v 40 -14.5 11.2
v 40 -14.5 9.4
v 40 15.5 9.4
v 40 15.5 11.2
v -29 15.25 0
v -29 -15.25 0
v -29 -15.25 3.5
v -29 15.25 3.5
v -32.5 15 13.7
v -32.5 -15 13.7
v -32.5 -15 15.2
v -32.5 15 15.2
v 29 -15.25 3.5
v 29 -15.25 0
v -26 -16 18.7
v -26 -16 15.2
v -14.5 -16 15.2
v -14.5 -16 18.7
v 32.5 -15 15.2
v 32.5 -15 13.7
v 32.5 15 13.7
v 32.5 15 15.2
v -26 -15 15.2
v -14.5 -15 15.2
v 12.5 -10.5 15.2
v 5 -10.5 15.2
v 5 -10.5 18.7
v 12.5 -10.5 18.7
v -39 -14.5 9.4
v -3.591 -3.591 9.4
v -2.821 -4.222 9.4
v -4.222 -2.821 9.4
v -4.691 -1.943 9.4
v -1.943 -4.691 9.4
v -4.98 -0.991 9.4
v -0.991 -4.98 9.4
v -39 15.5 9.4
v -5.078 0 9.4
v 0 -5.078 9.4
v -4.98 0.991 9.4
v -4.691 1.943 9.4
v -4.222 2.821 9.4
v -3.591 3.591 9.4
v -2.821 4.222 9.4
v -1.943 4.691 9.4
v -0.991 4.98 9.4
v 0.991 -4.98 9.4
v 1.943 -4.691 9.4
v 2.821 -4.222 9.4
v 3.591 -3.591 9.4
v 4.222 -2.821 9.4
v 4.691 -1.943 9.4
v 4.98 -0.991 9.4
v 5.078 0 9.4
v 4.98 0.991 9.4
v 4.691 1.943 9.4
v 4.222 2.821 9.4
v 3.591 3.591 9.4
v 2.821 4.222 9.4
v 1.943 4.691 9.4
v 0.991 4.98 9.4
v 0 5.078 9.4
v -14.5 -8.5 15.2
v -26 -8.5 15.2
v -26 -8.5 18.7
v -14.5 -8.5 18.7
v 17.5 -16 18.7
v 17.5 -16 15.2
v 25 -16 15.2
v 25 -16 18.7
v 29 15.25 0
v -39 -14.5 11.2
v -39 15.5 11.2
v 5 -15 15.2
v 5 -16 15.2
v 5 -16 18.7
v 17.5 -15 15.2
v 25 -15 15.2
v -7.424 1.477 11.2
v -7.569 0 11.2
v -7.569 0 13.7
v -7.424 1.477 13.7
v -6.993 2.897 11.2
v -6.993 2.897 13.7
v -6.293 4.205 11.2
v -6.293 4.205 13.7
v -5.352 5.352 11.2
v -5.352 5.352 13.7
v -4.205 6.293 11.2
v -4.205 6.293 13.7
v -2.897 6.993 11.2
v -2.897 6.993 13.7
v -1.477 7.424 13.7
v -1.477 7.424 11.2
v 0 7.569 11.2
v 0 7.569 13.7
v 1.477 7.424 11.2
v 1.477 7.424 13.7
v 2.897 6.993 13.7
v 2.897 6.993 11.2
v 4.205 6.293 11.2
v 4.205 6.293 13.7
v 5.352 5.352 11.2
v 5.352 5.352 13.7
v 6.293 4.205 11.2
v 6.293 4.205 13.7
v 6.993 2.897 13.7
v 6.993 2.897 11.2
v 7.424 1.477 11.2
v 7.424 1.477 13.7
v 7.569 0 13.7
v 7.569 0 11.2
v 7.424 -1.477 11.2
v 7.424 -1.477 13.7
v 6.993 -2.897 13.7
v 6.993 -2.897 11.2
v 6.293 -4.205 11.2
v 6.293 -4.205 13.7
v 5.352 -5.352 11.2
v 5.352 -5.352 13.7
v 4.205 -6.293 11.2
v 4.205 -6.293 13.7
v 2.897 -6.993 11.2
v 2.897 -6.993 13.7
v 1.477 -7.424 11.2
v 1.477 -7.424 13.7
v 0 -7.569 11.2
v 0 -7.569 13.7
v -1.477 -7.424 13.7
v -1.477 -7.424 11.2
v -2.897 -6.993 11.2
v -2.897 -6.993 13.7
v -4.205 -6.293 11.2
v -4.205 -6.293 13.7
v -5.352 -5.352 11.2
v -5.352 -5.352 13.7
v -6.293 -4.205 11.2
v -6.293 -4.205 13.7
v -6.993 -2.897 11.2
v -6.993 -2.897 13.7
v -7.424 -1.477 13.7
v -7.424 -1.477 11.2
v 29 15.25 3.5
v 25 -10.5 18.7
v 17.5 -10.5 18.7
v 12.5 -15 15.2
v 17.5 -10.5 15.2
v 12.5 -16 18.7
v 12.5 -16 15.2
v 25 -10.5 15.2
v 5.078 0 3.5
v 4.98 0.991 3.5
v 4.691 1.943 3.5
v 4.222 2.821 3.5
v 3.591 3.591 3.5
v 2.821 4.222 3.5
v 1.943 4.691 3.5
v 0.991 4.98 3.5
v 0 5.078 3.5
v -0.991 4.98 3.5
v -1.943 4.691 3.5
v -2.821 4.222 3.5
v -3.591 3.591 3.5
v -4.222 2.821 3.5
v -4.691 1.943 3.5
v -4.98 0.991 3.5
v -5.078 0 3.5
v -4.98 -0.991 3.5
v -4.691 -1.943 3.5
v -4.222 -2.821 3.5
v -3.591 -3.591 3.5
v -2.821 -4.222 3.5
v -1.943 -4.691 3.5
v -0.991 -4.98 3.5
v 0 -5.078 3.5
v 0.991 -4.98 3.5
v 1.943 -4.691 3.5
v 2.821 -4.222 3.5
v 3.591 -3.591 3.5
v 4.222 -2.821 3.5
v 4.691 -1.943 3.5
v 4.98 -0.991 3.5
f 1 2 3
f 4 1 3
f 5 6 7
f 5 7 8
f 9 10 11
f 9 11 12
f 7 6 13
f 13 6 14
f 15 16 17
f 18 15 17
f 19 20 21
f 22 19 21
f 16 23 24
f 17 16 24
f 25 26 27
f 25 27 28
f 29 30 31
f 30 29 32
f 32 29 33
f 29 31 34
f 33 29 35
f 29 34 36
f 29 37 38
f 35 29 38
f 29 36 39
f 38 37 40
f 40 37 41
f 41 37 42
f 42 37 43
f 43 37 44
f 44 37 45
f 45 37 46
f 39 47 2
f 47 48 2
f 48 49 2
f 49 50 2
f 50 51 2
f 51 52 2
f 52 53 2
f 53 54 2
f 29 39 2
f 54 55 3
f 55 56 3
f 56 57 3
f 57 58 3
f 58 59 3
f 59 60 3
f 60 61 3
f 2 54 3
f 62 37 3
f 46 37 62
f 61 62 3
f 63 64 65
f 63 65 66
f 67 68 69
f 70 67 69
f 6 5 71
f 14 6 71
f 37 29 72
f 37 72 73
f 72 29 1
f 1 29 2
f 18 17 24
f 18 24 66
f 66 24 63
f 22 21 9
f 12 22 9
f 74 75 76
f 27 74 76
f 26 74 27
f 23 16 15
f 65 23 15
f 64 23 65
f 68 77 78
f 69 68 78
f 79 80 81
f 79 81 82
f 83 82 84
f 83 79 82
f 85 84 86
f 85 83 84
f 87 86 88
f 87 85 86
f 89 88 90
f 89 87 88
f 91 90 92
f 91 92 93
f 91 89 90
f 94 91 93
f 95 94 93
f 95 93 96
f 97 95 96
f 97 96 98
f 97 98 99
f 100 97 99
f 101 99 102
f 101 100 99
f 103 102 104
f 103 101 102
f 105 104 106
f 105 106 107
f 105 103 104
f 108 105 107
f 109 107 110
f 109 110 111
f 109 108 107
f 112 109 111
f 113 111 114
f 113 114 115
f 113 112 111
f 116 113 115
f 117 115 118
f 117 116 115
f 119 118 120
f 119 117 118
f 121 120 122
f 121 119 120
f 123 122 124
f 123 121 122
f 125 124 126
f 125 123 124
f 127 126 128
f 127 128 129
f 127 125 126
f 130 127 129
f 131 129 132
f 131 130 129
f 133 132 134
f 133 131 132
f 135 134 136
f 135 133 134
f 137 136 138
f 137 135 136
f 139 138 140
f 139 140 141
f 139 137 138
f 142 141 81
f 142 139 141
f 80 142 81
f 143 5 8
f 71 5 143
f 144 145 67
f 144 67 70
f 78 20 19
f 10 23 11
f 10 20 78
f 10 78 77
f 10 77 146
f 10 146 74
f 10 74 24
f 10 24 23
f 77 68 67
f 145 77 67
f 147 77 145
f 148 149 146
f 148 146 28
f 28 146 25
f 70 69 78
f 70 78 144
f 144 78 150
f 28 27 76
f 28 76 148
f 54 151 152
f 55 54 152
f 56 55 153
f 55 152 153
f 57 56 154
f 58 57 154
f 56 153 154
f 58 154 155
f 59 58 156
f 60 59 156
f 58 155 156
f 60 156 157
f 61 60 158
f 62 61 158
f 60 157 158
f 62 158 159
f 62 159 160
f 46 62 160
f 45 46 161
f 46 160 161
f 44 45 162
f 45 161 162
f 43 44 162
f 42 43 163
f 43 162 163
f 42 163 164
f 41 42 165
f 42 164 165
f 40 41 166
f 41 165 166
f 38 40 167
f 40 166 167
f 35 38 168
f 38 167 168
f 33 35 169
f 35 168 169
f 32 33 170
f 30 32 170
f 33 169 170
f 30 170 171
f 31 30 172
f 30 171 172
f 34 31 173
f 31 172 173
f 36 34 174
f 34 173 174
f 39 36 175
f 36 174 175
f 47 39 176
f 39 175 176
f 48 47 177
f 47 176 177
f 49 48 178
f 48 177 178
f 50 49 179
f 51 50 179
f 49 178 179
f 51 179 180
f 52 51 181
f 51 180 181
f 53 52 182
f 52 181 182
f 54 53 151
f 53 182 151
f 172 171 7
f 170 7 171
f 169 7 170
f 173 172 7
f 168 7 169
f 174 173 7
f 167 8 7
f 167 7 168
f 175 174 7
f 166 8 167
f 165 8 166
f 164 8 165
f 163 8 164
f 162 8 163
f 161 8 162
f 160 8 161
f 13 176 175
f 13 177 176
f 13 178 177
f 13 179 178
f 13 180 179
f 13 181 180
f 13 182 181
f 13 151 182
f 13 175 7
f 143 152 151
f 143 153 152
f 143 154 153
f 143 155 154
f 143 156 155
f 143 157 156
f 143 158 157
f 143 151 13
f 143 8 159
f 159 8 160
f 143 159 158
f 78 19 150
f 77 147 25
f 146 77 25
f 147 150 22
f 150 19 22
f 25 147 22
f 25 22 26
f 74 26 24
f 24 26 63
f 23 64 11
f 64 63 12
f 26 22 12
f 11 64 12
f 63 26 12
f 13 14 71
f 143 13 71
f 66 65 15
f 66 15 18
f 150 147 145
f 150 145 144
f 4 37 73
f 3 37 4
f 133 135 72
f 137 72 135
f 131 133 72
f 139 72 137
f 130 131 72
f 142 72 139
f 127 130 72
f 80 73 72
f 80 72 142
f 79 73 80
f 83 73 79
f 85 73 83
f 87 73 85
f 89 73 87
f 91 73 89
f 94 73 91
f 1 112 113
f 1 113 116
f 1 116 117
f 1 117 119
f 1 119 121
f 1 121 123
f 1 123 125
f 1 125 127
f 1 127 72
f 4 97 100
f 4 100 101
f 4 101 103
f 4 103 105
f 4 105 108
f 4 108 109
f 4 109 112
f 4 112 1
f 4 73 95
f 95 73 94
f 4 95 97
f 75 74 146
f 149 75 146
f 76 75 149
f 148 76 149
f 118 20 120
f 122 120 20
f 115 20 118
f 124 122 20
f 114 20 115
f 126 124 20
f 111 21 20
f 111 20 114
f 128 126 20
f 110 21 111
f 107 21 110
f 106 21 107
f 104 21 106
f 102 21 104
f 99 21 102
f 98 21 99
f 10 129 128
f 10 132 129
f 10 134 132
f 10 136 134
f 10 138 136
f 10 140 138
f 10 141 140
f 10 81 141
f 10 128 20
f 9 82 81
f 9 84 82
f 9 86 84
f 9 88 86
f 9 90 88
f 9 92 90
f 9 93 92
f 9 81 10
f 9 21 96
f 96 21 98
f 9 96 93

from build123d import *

# Parameters (mm, degrees)
SKETCH1_W           = 58
SKETCH1_H           = 30.5
BOSS_EXTRUDE1_DEPTH = 3.5
SKETCH2_R           = 5.077771543
BOSS_EXTRUDE2_DEPTH = 5.9
SKETCH3_W           = 79
SKETCH3_H           = 30
BOSS_EXTRUDE3_DEPTH = 1.8
SKETCH4_R           = 7.569009477
BOSS_EXTRUDE4_DEPTH = 2.5
SKETCH5_W           = 65
SKETCH5_H           = 30
BOSS_EXTRUDE5_DEPTH = 1.5
SKETCH6_W           = 11.5
SKETCH6_H           = 7.5
SKETCH6_W_2         = 7.5
SKETCH6_H_2         = 5.5
BOSS_EXTRUDE6_DEPTH = 3.5


with BuildPart() as part:
    # Sketch1 → Boss-Extrude1 (new body)
    with BuildSketch(Plane.XY):
        Rectangle(SKETCH1_W, SKETCH1_H)
    extrude(amount=BOSS_EXTRUDE1_DEPTH)

    # Sketch2 → Boss-Extrude2 (add)
    with BuildSketch(Plane.XY.offset(3.5)):
        Circle(SKETCH2_R)
    extrude(amount=BOSS_EXTRUDE2_DEPTH)

    # Sketch3 → Boss-Extrude3 (add)
    with BuildSketch(Plane.XY.offset(9.4)):
        with Locations((0.5, 0.5)):
            Rectangle(SKETCH3_W, SKETCH3_H)
    extrude(amount=BOSS_EXTRUDE3_DEPTH)

    # Sketch4 → Boss-Extrude4 (add)
    with BuildSketch(Plane(origin=(0, 0, 11.2), x_dir=(-1, 0, 0), z_dir=(0, 0, -1))):
        Circle(SKETCH4_R)
    extrude(amount=-BOSS_EXTRUDE4_DEPTH)

    # Sketch5 → Boss-Extrude5 (add)
    with BuildSketch(Plane(origin=(0, 0, 13.7), x_dir=(-1, 0, 0), z_dir=(0, 0, -1))):
        Rectangle(SKETCH5_W, SKETCH5_H)
    extrude(amount=-BOSS_EXTRUDE5_DEPTH)

    # Sketch6 → Boss-Extrude6 (add)
    with BuildSketch(Plane.XY.offset(15.2)):
        with Locations((-20.25, -12.25)):
            Rectangle(SKETCH6_W, SKETCH6_H)
        with Locations((21.25, -13.25)):
            Rectangle(SKETCH6_W_2, SKETCH6_H_2)
        with Locations((8.75, -13.25)):
            Rectangle(SKETCH6_W_2, SKETCH6_H_2)
    extrude(amount=BOSS_EXTRUDE6_DEPTH)


solid = part.part
